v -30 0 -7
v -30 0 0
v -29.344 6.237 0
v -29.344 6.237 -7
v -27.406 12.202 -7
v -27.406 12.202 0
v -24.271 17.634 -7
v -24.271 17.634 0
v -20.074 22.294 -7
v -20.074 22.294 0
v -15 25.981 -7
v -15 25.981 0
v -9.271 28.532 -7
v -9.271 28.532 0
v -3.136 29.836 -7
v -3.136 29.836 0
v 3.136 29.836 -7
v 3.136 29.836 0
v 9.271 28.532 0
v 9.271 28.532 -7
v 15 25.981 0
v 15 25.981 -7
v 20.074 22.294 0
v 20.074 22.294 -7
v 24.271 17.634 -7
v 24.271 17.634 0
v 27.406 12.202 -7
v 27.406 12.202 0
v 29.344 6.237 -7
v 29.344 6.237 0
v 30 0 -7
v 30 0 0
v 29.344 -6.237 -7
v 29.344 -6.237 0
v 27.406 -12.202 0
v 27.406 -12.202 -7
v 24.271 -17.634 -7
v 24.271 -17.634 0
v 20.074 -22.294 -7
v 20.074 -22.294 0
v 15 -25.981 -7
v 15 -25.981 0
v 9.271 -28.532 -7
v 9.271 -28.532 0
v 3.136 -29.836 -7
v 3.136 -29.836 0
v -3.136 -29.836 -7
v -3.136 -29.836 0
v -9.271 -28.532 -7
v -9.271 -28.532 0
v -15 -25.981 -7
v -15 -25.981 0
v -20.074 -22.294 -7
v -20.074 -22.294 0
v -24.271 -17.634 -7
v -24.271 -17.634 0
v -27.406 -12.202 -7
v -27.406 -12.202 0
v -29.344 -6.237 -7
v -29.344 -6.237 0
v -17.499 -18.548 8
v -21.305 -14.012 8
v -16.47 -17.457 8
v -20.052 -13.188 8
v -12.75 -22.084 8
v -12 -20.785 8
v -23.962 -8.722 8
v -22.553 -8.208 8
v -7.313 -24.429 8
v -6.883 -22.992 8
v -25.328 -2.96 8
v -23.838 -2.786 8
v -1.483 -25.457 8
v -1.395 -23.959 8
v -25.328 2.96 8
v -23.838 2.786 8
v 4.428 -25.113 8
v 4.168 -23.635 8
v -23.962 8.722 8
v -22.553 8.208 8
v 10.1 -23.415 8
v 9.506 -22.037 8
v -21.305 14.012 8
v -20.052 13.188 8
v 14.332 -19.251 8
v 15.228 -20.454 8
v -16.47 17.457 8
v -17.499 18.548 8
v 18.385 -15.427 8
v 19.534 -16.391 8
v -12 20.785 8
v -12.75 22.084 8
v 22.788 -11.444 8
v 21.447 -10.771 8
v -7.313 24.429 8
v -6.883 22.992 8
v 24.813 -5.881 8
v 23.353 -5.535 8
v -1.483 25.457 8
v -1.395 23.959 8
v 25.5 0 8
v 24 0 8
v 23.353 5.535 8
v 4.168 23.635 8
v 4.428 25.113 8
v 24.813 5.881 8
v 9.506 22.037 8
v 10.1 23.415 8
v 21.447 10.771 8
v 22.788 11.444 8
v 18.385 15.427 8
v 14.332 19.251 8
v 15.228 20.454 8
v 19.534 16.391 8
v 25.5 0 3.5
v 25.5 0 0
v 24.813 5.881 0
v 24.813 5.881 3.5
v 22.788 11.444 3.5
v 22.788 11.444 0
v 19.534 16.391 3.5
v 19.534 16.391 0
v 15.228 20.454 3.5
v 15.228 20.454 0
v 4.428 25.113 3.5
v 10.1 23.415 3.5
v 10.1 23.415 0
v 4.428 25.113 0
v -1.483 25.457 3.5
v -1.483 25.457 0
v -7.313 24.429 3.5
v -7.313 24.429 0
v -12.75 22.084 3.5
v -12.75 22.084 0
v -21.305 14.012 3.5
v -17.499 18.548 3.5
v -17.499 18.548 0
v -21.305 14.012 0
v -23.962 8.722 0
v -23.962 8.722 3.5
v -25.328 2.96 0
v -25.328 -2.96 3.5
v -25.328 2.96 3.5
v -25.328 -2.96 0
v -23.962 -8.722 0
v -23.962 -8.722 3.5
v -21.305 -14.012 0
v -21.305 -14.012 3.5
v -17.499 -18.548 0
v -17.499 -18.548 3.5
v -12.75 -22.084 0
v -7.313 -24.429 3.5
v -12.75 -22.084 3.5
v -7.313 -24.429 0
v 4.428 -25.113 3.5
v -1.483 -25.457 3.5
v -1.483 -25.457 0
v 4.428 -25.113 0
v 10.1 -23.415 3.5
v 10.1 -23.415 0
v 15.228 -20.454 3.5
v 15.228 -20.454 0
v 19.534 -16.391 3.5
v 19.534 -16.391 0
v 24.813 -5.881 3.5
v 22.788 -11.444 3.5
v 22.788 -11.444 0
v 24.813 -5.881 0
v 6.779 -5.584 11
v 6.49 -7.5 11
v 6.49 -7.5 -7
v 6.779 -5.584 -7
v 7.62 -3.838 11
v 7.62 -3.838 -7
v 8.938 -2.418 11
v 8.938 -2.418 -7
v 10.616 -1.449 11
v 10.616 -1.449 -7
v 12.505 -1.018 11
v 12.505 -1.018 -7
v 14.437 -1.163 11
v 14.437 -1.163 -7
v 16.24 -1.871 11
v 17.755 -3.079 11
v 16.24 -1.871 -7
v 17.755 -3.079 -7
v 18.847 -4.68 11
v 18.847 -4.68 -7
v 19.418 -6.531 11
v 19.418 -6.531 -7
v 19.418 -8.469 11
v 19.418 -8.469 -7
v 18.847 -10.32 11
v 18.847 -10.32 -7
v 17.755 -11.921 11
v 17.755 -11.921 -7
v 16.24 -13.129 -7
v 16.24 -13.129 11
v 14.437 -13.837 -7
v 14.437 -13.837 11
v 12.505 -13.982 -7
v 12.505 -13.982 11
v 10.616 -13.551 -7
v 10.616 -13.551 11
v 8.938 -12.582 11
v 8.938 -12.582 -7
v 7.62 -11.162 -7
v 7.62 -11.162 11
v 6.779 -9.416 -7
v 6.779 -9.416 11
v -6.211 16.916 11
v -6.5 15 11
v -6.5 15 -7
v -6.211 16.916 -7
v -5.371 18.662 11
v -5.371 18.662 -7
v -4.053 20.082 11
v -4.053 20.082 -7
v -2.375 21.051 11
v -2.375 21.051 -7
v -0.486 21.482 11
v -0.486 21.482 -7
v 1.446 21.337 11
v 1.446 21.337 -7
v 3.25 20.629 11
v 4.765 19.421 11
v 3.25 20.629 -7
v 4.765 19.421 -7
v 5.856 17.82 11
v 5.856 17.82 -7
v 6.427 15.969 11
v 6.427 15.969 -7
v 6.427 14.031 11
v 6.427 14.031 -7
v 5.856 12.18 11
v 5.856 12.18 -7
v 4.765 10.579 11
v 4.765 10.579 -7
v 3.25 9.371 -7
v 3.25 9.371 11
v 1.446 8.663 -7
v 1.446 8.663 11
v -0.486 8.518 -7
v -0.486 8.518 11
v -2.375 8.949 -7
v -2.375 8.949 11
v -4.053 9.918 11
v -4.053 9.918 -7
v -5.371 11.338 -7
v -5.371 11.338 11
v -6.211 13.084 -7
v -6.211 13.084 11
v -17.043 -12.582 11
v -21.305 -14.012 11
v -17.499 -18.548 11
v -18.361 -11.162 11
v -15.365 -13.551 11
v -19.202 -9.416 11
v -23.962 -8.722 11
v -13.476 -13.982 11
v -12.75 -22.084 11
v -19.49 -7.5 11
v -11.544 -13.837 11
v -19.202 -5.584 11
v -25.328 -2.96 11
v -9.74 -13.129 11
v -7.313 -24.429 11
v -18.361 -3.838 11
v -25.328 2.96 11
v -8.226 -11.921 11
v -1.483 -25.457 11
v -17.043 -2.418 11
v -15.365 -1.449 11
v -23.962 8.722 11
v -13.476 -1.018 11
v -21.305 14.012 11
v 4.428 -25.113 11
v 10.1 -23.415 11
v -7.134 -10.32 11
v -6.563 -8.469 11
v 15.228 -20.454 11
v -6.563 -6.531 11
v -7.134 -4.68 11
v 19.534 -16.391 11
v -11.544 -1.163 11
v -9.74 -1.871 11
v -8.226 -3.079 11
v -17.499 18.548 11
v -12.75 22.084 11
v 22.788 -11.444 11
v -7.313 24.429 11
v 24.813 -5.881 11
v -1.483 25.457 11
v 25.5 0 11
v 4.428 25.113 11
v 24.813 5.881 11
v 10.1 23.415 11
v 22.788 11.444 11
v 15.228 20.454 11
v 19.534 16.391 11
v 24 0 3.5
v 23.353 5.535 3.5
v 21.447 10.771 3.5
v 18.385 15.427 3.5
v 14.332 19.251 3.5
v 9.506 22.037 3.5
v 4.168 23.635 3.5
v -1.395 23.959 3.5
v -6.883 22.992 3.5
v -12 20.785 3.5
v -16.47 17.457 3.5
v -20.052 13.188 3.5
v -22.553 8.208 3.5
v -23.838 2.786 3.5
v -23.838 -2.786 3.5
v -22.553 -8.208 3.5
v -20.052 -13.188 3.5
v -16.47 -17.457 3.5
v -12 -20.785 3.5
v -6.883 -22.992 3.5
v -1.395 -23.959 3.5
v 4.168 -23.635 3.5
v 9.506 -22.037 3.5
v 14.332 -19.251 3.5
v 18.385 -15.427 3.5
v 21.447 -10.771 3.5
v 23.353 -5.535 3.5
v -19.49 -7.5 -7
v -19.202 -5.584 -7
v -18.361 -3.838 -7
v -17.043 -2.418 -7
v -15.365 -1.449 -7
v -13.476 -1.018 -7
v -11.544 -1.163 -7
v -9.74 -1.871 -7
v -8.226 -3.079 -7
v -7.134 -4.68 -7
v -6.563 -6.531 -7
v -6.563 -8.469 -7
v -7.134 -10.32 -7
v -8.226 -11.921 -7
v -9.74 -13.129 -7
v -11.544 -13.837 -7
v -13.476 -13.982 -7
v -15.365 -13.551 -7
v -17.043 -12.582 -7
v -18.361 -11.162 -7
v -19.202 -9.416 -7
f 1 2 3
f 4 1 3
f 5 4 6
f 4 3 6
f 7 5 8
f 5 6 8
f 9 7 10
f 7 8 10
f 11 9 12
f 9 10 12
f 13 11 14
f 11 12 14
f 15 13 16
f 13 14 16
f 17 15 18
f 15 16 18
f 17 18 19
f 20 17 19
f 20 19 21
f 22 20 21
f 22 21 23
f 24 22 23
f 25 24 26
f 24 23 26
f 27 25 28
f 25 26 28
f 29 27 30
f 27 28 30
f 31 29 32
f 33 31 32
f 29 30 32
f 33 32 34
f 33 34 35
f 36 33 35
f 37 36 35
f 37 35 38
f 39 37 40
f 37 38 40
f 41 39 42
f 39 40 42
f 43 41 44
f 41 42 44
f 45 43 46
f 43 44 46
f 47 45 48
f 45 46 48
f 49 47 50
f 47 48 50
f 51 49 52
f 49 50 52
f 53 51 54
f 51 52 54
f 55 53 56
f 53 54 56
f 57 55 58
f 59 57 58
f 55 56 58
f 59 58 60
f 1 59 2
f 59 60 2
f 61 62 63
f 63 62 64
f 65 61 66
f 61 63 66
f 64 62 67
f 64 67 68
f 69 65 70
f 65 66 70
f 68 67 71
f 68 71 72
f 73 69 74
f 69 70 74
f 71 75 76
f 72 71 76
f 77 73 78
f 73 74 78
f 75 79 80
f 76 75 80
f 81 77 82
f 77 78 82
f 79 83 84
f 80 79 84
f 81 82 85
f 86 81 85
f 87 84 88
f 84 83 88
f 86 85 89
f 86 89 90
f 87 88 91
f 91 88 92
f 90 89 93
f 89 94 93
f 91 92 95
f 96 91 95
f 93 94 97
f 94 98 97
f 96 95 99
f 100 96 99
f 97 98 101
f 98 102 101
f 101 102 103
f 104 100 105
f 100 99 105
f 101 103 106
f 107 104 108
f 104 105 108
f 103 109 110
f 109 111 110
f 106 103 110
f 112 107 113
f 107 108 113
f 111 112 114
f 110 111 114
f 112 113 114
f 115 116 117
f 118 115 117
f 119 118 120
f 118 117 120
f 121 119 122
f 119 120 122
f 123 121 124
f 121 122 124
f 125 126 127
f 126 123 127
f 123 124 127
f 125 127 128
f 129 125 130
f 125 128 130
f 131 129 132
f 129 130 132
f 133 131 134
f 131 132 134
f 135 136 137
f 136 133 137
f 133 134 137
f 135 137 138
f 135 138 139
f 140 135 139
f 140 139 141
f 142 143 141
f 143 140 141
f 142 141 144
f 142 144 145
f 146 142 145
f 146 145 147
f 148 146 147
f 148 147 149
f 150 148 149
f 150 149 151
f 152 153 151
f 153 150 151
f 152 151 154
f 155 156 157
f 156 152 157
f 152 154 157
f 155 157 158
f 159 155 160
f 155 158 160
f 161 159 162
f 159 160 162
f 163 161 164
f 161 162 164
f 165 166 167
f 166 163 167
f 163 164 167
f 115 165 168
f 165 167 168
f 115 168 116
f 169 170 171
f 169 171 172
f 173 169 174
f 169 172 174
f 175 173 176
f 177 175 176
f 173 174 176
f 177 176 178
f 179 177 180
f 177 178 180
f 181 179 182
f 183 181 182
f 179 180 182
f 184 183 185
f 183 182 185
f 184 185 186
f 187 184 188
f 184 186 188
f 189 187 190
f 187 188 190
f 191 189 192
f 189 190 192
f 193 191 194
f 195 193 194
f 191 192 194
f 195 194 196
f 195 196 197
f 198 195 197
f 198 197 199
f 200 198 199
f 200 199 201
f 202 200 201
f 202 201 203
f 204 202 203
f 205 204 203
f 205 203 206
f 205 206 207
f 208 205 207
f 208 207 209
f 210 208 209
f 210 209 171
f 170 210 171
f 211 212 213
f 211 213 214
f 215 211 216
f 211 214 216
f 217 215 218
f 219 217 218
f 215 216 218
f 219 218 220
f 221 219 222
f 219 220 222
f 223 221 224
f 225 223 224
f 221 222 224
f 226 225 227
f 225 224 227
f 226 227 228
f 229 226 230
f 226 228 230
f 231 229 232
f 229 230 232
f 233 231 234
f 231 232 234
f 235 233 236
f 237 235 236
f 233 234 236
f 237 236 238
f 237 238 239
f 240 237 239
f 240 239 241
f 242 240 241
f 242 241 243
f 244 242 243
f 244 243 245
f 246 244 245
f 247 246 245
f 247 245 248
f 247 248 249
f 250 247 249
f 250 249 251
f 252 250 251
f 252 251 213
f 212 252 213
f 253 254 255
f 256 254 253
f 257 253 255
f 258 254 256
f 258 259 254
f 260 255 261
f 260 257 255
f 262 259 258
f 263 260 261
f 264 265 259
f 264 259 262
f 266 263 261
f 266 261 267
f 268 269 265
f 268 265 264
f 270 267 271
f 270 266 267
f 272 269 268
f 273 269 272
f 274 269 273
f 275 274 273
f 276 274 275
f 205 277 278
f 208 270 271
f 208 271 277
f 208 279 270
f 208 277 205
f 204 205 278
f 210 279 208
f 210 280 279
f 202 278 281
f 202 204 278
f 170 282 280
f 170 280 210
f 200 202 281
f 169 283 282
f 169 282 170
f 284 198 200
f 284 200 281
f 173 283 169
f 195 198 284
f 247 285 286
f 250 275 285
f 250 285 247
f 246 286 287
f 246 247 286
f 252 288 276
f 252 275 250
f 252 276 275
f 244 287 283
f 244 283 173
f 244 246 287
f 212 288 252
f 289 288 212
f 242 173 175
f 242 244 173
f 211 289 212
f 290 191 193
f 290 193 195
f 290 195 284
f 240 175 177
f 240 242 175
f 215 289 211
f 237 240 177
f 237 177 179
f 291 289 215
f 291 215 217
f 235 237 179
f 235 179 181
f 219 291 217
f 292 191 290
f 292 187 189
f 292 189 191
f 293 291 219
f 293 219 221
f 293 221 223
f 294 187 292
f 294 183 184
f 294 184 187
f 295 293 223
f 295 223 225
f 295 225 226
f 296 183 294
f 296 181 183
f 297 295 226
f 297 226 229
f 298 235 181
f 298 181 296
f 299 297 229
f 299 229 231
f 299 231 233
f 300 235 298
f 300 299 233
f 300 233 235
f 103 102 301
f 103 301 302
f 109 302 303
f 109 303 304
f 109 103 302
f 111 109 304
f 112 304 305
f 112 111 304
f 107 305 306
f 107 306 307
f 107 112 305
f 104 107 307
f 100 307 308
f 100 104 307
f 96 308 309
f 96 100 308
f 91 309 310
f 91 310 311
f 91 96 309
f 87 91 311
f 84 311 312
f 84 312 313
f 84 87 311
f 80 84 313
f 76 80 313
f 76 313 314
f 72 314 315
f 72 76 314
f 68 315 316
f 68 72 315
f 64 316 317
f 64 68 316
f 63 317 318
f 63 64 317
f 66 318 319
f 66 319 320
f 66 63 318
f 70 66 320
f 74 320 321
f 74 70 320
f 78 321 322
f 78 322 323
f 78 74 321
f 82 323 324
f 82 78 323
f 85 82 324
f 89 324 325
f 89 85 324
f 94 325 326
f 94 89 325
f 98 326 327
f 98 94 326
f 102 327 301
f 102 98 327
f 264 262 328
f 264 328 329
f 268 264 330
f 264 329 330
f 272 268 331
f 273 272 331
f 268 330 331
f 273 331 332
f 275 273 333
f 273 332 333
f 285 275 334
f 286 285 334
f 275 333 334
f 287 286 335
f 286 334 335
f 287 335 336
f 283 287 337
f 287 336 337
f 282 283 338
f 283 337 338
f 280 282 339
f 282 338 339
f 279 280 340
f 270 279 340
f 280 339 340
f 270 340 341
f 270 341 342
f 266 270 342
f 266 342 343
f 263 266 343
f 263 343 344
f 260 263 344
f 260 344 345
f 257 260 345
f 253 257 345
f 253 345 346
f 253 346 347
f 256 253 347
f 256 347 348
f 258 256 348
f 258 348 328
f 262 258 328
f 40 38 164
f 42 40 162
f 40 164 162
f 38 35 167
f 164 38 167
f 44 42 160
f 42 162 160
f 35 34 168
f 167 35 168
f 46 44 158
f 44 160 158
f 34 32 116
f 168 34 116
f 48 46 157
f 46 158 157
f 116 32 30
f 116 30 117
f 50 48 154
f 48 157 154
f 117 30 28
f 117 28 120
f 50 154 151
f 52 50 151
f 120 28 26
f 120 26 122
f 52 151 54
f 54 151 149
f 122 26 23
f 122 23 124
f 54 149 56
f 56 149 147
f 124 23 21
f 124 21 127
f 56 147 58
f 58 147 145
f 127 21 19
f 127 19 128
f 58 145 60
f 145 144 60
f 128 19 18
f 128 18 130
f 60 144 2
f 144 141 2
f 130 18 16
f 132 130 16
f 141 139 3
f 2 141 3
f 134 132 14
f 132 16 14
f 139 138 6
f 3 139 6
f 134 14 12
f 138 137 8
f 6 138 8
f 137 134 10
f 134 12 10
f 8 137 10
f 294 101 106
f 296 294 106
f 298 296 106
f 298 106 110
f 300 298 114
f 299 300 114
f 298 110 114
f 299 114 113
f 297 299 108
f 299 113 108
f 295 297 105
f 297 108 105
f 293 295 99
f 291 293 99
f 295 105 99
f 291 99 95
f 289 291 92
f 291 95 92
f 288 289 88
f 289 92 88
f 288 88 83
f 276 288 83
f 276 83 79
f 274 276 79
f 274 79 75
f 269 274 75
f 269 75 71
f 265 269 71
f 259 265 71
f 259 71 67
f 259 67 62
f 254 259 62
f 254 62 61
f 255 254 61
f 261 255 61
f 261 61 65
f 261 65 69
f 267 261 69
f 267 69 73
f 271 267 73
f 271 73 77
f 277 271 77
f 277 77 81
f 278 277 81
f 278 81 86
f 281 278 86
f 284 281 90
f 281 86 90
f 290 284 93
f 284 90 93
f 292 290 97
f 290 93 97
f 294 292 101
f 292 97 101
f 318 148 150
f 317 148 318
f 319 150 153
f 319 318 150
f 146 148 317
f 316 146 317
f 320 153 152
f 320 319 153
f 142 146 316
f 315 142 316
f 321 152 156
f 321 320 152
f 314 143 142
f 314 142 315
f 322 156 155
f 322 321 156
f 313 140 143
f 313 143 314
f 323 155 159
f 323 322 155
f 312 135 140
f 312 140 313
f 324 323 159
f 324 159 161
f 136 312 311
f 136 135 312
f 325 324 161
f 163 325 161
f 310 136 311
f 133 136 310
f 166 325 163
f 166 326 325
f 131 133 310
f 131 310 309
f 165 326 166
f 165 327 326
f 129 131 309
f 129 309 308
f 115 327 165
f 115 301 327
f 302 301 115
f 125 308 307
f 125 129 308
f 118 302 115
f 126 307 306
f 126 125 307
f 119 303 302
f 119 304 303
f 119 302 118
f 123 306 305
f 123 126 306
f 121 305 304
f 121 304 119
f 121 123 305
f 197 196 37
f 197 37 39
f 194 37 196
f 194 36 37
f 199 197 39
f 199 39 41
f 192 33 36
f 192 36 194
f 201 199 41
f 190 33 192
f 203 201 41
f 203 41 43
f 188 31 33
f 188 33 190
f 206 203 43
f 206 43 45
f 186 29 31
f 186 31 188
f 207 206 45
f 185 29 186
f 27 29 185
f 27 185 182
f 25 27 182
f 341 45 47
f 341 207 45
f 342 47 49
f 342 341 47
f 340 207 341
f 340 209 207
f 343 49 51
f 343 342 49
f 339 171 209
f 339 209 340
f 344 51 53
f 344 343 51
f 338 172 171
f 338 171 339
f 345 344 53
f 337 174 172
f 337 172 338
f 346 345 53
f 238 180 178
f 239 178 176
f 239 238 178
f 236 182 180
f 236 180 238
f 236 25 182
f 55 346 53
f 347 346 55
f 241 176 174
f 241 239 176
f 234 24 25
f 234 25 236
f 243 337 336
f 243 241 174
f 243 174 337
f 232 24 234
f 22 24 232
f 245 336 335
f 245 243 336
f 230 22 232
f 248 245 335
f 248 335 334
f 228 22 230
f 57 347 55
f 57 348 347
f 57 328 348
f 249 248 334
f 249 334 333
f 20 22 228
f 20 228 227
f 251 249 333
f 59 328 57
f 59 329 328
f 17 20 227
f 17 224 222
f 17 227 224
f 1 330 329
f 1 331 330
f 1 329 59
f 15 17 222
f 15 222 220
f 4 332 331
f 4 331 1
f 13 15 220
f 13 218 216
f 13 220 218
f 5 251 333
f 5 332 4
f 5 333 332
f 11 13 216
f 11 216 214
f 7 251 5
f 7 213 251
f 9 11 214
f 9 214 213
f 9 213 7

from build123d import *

# Parameters (mm, degrees)
SKETCH1_R           = 25.5
BOSS_EXTRUDE1_DEPTH = 11
SKETCH2_R           = 30
BOSS_EXTRUDE2_DEPTH = 7
SKETCH3_R           = 37.476082354
SKETCH3_R_2         = 24
CUT_EXTRUDE1_DEPTH  = 4.5
SKETCH5_R           = 6.5
CUT_EXTRUDE2_DEPTH  = 30.5


with BuildPart() as part:
    # Sketch1 → Boss-Extrude1 (new body)
    with BuildSketch(Plane.XY):
        Circle(SKETCH1_R)
    extrude(amount=BOSS_EXTRUDE1_DEPTH)

    # Sketch2 → Boss-Extrude2 (add)
    with BuildSketch(Plane(origin=(0, 0, 0), x_dir=(-1, 0, 0), z_dir=(0, 0, -1))):
        Circle(SKETCH2_R)
    extrude(amount=BOSS_EXTRUDE2_DEPTH)

    # Sketch3 → Cut-Extrude1 (cut)
    with BuildSketch(Plane.XY.offset(8)):
        Circle(SKETCH3_R)
        Circle(SKETCH3_R_2, mode=Mode.SUBTRACT)
    extrude(amount=-CUT_EXTRUDE1_DEPTH, mode=Mode.SUBTRACT)

    # Sketch5 → Cut-Extrude2 (cut)
    with BuildSketch(Plane(origin=(0, 0, -7), x_dir=(-1, 0, 0), z_dir=(0, 0, -1))):
        with Locations((0, 15)):
            Circle(SKETCH5_R)
        with Locations((-12.990381057, -7.5)):
            Circle(SKETCH5_R)
        with Locations((12.990381057, -7.5)):
            Circle(SKETCH5_R)
    extrude(amount=-CUT_EXTRUDE2_DEPTH, mode=Mode.SUBTRACT)


solid = part.part
